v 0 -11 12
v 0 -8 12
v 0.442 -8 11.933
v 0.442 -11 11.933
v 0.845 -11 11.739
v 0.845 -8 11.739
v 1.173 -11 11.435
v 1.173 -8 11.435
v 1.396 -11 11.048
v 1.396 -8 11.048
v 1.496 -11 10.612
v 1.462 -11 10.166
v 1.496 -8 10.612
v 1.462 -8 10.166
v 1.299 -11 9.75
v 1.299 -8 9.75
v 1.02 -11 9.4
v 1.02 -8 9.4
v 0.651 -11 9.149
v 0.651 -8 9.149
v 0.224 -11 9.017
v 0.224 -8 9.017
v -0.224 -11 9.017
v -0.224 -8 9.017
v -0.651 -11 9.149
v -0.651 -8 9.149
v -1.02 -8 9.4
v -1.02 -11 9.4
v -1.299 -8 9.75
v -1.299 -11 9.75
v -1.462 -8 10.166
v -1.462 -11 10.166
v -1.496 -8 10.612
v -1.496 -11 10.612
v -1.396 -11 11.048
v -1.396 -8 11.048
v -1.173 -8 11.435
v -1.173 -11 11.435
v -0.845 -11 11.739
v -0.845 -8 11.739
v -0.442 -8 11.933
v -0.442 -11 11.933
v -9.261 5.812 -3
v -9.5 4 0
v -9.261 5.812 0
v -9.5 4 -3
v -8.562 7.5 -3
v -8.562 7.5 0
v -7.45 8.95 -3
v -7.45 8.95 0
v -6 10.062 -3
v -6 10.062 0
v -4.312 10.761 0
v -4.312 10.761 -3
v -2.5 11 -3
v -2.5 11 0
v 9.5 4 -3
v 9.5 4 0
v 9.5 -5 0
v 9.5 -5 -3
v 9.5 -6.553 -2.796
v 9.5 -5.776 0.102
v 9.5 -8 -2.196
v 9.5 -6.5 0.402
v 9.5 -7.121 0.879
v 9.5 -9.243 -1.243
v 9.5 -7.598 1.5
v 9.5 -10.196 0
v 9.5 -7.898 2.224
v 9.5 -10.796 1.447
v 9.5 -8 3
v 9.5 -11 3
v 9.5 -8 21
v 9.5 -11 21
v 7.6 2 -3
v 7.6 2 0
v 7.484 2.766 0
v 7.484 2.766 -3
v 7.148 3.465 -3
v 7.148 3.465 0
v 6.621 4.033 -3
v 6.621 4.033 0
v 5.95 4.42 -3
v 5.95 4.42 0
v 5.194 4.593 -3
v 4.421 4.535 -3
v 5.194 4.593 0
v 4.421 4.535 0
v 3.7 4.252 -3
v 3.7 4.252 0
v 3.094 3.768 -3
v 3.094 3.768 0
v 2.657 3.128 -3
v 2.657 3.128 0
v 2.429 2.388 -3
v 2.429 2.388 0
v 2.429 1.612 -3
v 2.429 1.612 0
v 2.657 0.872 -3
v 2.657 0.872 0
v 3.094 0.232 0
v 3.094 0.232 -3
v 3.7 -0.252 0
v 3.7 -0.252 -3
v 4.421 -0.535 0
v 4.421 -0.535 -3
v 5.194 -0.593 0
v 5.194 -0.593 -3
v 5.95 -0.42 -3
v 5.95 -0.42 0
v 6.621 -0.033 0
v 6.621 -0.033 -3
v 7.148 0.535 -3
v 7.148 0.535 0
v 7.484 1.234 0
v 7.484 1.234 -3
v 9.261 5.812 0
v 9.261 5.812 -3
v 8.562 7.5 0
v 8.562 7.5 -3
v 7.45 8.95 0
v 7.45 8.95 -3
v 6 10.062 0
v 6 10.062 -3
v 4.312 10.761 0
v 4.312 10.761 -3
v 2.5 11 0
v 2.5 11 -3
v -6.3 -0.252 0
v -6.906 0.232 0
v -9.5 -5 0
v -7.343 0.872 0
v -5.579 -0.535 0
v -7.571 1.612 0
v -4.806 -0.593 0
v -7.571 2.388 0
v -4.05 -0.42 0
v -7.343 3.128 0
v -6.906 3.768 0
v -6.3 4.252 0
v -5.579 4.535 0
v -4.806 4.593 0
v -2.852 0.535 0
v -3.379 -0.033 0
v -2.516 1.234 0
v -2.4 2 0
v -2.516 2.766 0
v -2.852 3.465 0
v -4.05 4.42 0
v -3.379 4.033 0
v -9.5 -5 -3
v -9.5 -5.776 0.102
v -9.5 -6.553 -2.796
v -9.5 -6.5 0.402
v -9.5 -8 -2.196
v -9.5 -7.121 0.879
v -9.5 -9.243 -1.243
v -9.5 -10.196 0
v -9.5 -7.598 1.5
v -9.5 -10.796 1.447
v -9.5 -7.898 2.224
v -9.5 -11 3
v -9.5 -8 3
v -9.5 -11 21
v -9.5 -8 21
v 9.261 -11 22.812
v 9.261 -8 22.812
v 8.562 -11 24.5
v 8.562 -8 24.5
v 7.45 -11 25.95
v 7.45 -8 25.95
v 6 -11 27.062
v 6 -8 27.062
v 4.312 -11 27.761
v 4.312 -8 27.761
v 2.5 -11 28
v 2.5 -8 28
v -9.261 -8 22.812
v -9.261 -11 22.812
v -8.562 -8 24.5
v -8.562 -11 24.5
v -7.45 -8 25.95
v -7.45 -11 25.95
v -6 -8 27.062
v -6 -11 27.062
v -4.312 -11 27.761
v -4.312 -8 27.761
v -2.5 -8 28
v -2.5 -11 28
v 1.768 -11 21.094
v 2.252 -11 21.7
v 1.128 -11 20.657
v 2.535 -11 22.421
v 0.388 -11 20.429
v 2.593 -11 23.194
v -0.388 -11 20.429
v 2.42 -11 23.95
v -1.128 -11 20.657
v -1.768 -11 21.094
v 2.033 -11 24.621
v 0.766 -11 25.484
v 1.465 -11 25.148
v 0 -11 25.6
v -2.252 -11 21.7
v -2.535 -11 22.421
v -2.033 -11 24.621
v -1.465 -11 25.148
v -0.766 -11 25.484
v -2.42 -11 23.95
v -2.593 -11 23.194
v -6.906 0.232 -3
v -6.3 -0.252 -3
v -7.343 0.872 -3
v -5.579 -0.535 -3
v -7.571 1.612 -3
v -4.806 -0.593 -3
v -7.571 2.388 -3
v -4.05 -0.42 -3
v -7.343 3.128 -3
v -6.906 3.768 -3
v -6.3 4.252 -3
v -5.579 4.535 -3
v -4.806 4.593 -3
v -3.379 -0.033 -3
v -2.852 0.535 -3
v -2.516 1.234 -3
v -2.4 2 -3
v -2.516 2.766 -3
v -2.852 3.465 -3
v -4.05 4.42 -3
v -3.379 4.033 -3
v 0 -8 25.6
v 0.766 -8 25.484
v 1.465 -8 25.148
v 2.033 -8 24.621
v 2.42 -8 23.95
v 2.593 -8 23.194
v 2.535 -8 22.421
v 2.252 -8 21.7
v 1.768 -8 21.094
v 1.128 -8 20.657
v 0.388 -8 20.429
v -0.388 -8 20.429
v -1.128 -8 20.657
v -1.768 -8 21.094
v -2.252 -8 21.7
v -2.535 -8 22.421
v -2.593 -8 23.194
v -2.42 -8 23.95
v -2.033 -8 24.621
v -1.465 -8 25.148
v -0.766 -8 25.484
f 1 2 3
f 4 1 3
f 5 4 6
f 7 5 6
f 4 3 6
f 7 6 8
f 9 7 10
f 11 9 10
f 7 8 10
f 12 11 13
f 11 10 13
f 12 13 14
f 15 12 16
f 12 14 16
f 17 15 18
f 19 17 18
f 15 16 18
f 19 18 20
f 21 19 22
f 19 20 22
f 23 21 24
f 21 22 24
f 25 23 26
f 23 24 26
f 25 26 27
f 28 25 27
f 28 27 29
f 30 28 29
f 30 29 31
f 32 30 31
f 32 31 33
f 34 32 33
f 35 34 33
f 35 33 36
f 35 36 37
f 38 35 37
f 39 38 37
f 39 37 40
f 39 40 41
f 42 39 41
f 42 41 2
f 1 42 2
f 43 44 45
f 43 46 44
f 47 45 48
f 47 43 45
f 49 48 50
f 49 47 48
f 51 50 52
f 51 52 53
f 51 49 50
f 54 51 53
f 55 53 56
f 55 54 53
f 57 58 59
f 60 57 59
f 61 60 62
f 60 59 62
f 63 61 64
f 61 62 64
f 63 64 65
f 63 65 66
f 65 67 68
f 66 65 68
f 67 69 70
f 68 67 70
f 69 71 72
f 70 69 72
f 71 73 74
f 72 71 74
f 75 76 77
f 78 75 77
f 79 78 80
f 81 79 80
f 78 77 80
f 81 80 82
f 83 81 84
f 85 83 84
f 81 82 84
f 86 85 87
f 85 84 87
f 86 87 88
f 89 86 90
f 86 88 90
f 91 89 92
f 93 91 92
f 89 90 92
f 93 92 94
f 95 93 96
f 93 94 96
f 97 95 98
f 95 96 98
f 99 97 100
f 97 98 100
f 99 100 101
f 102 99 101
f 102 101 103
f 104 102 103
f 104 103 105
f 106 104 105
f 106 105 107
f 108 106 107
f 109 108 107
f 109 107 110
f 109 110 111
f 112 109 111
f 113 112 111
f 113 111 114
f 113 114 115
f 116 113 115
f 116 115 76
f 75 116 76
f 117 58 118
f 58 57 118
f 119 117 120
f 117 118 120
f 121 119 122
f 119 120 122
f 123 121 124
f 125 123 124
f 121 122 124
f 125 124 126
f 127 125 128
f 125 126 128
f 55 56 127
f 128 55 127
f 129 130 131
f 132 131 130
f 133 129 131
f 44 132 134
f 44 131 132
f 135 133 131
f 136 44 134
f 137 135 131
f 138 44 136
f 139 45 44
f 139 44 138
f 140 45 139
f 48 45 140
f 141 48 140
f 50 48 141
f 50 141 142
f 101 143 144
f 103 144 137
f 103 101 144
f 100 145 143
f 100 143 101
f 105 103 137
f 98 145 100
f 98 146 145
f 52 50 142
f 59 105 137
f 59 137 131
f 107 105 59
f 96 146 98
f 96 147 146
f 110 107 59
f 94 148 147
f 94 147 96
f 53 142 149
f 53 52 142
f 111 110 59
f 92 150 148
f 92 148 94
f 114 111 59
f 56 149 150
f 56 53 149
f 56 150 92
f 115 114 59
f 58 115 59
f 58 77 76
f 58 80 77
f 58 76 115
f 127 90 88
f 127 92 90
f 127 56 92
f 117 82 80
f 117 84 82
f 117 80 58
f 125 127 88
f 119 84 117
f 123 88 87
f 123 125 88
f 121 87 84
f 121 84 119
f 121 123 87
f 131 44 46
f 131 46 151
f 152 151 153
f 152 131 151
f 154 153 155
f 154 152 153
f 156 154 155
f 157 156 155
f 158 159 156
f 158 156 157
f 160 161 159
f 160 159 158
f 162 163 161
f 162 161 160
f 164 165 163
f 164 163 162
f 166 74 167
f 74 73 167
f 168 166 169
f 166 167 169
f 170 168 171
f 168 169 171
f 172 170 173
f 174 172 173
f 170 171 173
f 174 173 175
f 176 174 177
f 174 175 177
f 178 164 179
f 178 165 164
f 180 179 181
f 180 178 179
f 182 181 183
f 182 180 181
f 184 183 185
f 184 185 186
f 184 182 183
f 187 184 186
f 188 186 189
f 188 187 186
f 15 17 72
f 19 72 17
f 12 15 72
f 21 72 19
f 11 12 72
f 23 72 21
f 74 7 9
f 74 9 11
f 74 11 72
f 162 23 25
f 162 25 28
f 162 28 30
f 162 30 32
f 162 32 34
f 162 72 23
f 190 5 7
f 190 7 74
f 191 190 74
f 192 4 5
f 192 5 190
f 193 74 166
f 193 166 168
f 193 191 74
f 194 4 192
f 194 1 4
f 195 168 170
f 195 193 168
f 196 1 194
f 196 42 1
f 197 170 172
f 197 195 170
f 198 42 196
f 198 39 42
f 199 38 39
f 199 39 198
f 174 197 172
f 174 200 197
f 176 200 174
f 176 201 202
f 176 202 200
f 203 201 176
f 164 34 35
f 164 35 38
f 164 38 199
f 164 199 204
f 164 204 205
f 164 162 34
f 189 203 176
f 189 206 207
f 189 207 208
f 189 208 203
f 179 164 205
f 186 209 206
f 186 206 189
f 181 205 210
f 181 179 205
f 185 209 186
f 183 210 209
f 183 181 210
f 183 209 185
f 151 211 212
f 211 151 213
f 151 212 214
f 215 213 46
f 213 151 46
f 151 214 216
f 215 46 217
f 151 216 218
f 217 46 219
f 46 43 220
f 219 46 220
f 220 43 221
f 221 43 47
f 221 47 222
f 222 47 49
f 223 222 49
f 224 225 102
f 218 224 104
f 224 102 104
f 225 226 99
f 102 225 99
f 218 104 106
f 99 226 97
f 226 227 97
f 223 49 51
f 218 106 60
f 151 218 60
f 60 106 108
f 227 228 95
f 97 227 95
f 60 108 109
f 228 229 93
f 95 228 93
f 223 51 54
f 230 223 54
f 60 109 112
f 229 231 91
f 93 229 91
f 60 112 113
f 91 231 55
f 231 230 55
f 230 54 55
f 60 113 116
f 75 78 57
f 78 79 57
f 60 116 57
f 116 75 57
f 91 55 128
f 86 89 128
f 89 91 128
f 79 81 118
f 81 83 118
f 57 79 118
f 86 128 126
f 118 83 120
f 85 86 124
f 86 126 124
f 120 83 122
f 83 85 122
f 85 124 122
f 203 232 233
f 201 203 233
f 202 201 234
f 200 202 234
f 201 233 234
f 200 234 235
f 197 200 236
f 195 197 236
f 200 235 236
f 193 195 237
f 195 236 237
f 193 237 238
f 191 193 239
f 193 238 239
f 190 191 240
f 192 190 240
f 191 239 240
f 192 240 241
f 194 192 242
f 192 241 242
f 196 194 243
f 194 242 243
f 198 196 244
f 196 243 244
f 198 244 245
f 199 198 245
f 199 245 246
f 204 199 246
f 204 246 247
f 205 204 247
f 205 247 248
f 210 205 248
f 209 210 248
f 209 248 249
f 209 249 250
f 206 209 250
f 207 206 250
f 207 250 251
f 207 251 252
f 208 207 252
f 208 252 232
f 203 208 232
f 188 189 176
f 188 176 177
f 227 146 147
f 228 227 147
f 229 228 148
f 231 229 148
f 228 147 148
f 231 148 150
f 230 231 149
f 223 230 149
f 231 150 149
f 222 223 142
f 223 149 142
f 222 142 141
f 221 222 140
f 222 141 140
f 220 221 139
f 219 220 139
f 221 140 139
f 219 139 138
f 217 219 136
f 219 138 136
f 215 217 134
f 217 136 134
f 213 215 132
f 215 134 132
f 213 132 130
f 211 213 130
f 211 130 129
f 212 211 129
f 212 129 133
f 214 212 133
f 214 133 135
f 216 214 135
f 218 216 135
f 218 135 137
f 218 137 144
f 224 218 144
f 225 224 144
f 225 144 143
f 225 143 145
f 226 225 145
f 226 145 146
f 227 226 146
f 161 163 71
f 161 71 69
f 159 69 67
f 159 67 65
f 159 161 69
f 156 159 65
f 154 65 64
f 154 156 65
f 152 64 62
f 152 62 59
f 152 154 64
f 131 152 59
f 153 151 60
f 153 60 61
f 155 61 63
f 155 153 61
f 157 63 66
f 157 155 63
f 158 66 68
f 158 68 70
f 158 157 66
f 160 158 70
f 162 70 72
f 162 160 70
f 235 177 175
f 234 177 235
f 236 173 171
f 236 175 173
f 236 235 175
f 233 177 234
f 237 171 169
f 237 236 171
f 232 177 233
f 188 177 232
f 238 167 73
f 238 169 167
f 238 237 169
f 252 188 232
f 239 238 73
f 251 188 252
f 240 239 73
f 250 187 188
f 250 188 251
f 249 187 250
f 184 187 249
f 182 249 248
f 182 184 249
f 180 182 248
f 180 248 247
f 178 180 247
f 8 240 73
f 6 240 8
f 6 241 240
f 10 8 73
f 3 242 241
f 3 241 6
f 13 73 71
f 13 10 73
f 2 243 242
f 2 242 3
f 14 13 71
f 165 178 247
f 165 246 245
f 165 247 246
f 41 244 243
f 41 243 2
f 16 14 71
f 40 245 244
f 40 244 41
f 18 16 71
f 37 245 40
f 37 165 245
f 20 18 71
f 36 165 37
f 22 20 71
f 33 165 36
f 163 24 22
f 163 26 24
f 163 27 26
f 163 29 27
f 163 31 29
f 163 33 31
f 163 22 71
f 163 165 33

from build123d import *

# Parameters (mm, degrees)
SKETCH1_W                    = 19
SKETCH1_H                    = 22
BASE_FLANGE1_DEPTH           = 3
EDGE_FLANGE1_STRIP_W         = 18
EDGE_FLANGE1_STRIP_H         = 3
EDGE_FLANGE1_STRIP_CUT_DEPTH = 19
EDGE_FLANGE1_DEPTH           = 19
SKETCH12_R                   = 2.6
CUT_EXTRUDE1_DEPTH           = 10
SKETCH13_R                   = 2.6
CUT_EXTRUDE2_DEPTH           = 36.146123542
FILLET1_R                    = 7
SKETCH14_R                   = 1.5
CUT_EXTRUDE3_DEPTH           = 36.146123542


# Sheet-metal steps are written as plain solids
with BuildPart() as part:
    # Sketch1 → Base-Flange1 (new body)
    with BuildSketch(Plane.XY):
        Rectangle(SKETCH1_W, SKETCH1_H)
    extrude(amount=-BASE_FLANGE1_DEPTH)

    # Edge-Flange1 strip (across the edge) → Edge-Flange1 strip cut (cut)
    with BuildSketch(Plane(origin=(-9.5, -11, 0), x_dir=(0, 1, 0), z_dir=(1, 0, 0))):
        with Locations((-3, -1.5)):
            Rectangle(EDGE_FLANGE1_STRIP_W, EDGE_FLANGE1_STRIP_H)
    extrude(amount=EDGE_FLANGE1_STRIP_CUT_DEPTH, mode=Mode.SUBTRACT)

    # Edge-Flange1 section (across the edge) → Edge-Flange1 (add)
    with BuildSketch(Plane(origin=(-9.5, -11, 0), x_dir=(0, 1, 0), z_dir=(1, 0, 0))):
        with BuildLine():
            Line((0, 3), (0, 28))
            Line((0, 28), (3, 28))
            Line((3, 28), (3, 3))
            ThreePointArc((3, 3), (3.878679656, 0.878679656), (6, 0))
            Line((6, 0), (6, -3))
            ThreePointArc((6, -3), (1.757359313, -1.242640687), (0, 3))
        make_face()
    extrude(amount=EDGE_FLANGE1_DEPTH)

    # Sketch12 → Cut-Extrude1 (cut)
    with BuildSketch(Plane.XY):
        with Locations((5, 2)):
            Circle(SKETCH12_R)
        with Locations((-5, 2)):
            Circle(SKETCH12_R)
    extrude(amount=-CUT_EXTRUDE1_DEPTH, mode=Mode.SUBTRACT)

    # Sketch13 → Cut-Extrude2 (cut, through all)
    with BuildSketch(Plane(origin=(0, -8, 0), x_dir=(1, 0, 0), z_dir=(0, 1, 0))):
        with Locations(Location((0, -23, 0), (0, 0, 270))):
            Circle(SKETCH13_R)
    extrude(amount=-CUT_EXTRUDE2_DEPTH, mode=Mode.SUBTRACT)

    # Fillet1
    fillet1_edges = [part.edges().sort_by_distance(p)[0] for p in [
        (-9.5, -9.5, 28),
        (9.5, -9.5, 28),
        (-9.5, 11, -1.5),
        (9.5, 11, -1.5),
    ]]
    fillet(fillet1_edges, radius=FILLET1_R)

    # Sketch14 → Cut-Extrude3 (cut, through all)
    with BuildSketch(Plane(origin=(0, -8, 0), x_dir=(1, 0, 0), z_dir=(0, 1, 0))):
        with Locations(Location((0, -10.5, 0), (0, 0, 270))):
            Circle(SKETCH14_R)
    extrude(amount=-CUT_EXTRUDE3_DEPTH, mode=Mode.SUBTRACT)


solid = part.part
